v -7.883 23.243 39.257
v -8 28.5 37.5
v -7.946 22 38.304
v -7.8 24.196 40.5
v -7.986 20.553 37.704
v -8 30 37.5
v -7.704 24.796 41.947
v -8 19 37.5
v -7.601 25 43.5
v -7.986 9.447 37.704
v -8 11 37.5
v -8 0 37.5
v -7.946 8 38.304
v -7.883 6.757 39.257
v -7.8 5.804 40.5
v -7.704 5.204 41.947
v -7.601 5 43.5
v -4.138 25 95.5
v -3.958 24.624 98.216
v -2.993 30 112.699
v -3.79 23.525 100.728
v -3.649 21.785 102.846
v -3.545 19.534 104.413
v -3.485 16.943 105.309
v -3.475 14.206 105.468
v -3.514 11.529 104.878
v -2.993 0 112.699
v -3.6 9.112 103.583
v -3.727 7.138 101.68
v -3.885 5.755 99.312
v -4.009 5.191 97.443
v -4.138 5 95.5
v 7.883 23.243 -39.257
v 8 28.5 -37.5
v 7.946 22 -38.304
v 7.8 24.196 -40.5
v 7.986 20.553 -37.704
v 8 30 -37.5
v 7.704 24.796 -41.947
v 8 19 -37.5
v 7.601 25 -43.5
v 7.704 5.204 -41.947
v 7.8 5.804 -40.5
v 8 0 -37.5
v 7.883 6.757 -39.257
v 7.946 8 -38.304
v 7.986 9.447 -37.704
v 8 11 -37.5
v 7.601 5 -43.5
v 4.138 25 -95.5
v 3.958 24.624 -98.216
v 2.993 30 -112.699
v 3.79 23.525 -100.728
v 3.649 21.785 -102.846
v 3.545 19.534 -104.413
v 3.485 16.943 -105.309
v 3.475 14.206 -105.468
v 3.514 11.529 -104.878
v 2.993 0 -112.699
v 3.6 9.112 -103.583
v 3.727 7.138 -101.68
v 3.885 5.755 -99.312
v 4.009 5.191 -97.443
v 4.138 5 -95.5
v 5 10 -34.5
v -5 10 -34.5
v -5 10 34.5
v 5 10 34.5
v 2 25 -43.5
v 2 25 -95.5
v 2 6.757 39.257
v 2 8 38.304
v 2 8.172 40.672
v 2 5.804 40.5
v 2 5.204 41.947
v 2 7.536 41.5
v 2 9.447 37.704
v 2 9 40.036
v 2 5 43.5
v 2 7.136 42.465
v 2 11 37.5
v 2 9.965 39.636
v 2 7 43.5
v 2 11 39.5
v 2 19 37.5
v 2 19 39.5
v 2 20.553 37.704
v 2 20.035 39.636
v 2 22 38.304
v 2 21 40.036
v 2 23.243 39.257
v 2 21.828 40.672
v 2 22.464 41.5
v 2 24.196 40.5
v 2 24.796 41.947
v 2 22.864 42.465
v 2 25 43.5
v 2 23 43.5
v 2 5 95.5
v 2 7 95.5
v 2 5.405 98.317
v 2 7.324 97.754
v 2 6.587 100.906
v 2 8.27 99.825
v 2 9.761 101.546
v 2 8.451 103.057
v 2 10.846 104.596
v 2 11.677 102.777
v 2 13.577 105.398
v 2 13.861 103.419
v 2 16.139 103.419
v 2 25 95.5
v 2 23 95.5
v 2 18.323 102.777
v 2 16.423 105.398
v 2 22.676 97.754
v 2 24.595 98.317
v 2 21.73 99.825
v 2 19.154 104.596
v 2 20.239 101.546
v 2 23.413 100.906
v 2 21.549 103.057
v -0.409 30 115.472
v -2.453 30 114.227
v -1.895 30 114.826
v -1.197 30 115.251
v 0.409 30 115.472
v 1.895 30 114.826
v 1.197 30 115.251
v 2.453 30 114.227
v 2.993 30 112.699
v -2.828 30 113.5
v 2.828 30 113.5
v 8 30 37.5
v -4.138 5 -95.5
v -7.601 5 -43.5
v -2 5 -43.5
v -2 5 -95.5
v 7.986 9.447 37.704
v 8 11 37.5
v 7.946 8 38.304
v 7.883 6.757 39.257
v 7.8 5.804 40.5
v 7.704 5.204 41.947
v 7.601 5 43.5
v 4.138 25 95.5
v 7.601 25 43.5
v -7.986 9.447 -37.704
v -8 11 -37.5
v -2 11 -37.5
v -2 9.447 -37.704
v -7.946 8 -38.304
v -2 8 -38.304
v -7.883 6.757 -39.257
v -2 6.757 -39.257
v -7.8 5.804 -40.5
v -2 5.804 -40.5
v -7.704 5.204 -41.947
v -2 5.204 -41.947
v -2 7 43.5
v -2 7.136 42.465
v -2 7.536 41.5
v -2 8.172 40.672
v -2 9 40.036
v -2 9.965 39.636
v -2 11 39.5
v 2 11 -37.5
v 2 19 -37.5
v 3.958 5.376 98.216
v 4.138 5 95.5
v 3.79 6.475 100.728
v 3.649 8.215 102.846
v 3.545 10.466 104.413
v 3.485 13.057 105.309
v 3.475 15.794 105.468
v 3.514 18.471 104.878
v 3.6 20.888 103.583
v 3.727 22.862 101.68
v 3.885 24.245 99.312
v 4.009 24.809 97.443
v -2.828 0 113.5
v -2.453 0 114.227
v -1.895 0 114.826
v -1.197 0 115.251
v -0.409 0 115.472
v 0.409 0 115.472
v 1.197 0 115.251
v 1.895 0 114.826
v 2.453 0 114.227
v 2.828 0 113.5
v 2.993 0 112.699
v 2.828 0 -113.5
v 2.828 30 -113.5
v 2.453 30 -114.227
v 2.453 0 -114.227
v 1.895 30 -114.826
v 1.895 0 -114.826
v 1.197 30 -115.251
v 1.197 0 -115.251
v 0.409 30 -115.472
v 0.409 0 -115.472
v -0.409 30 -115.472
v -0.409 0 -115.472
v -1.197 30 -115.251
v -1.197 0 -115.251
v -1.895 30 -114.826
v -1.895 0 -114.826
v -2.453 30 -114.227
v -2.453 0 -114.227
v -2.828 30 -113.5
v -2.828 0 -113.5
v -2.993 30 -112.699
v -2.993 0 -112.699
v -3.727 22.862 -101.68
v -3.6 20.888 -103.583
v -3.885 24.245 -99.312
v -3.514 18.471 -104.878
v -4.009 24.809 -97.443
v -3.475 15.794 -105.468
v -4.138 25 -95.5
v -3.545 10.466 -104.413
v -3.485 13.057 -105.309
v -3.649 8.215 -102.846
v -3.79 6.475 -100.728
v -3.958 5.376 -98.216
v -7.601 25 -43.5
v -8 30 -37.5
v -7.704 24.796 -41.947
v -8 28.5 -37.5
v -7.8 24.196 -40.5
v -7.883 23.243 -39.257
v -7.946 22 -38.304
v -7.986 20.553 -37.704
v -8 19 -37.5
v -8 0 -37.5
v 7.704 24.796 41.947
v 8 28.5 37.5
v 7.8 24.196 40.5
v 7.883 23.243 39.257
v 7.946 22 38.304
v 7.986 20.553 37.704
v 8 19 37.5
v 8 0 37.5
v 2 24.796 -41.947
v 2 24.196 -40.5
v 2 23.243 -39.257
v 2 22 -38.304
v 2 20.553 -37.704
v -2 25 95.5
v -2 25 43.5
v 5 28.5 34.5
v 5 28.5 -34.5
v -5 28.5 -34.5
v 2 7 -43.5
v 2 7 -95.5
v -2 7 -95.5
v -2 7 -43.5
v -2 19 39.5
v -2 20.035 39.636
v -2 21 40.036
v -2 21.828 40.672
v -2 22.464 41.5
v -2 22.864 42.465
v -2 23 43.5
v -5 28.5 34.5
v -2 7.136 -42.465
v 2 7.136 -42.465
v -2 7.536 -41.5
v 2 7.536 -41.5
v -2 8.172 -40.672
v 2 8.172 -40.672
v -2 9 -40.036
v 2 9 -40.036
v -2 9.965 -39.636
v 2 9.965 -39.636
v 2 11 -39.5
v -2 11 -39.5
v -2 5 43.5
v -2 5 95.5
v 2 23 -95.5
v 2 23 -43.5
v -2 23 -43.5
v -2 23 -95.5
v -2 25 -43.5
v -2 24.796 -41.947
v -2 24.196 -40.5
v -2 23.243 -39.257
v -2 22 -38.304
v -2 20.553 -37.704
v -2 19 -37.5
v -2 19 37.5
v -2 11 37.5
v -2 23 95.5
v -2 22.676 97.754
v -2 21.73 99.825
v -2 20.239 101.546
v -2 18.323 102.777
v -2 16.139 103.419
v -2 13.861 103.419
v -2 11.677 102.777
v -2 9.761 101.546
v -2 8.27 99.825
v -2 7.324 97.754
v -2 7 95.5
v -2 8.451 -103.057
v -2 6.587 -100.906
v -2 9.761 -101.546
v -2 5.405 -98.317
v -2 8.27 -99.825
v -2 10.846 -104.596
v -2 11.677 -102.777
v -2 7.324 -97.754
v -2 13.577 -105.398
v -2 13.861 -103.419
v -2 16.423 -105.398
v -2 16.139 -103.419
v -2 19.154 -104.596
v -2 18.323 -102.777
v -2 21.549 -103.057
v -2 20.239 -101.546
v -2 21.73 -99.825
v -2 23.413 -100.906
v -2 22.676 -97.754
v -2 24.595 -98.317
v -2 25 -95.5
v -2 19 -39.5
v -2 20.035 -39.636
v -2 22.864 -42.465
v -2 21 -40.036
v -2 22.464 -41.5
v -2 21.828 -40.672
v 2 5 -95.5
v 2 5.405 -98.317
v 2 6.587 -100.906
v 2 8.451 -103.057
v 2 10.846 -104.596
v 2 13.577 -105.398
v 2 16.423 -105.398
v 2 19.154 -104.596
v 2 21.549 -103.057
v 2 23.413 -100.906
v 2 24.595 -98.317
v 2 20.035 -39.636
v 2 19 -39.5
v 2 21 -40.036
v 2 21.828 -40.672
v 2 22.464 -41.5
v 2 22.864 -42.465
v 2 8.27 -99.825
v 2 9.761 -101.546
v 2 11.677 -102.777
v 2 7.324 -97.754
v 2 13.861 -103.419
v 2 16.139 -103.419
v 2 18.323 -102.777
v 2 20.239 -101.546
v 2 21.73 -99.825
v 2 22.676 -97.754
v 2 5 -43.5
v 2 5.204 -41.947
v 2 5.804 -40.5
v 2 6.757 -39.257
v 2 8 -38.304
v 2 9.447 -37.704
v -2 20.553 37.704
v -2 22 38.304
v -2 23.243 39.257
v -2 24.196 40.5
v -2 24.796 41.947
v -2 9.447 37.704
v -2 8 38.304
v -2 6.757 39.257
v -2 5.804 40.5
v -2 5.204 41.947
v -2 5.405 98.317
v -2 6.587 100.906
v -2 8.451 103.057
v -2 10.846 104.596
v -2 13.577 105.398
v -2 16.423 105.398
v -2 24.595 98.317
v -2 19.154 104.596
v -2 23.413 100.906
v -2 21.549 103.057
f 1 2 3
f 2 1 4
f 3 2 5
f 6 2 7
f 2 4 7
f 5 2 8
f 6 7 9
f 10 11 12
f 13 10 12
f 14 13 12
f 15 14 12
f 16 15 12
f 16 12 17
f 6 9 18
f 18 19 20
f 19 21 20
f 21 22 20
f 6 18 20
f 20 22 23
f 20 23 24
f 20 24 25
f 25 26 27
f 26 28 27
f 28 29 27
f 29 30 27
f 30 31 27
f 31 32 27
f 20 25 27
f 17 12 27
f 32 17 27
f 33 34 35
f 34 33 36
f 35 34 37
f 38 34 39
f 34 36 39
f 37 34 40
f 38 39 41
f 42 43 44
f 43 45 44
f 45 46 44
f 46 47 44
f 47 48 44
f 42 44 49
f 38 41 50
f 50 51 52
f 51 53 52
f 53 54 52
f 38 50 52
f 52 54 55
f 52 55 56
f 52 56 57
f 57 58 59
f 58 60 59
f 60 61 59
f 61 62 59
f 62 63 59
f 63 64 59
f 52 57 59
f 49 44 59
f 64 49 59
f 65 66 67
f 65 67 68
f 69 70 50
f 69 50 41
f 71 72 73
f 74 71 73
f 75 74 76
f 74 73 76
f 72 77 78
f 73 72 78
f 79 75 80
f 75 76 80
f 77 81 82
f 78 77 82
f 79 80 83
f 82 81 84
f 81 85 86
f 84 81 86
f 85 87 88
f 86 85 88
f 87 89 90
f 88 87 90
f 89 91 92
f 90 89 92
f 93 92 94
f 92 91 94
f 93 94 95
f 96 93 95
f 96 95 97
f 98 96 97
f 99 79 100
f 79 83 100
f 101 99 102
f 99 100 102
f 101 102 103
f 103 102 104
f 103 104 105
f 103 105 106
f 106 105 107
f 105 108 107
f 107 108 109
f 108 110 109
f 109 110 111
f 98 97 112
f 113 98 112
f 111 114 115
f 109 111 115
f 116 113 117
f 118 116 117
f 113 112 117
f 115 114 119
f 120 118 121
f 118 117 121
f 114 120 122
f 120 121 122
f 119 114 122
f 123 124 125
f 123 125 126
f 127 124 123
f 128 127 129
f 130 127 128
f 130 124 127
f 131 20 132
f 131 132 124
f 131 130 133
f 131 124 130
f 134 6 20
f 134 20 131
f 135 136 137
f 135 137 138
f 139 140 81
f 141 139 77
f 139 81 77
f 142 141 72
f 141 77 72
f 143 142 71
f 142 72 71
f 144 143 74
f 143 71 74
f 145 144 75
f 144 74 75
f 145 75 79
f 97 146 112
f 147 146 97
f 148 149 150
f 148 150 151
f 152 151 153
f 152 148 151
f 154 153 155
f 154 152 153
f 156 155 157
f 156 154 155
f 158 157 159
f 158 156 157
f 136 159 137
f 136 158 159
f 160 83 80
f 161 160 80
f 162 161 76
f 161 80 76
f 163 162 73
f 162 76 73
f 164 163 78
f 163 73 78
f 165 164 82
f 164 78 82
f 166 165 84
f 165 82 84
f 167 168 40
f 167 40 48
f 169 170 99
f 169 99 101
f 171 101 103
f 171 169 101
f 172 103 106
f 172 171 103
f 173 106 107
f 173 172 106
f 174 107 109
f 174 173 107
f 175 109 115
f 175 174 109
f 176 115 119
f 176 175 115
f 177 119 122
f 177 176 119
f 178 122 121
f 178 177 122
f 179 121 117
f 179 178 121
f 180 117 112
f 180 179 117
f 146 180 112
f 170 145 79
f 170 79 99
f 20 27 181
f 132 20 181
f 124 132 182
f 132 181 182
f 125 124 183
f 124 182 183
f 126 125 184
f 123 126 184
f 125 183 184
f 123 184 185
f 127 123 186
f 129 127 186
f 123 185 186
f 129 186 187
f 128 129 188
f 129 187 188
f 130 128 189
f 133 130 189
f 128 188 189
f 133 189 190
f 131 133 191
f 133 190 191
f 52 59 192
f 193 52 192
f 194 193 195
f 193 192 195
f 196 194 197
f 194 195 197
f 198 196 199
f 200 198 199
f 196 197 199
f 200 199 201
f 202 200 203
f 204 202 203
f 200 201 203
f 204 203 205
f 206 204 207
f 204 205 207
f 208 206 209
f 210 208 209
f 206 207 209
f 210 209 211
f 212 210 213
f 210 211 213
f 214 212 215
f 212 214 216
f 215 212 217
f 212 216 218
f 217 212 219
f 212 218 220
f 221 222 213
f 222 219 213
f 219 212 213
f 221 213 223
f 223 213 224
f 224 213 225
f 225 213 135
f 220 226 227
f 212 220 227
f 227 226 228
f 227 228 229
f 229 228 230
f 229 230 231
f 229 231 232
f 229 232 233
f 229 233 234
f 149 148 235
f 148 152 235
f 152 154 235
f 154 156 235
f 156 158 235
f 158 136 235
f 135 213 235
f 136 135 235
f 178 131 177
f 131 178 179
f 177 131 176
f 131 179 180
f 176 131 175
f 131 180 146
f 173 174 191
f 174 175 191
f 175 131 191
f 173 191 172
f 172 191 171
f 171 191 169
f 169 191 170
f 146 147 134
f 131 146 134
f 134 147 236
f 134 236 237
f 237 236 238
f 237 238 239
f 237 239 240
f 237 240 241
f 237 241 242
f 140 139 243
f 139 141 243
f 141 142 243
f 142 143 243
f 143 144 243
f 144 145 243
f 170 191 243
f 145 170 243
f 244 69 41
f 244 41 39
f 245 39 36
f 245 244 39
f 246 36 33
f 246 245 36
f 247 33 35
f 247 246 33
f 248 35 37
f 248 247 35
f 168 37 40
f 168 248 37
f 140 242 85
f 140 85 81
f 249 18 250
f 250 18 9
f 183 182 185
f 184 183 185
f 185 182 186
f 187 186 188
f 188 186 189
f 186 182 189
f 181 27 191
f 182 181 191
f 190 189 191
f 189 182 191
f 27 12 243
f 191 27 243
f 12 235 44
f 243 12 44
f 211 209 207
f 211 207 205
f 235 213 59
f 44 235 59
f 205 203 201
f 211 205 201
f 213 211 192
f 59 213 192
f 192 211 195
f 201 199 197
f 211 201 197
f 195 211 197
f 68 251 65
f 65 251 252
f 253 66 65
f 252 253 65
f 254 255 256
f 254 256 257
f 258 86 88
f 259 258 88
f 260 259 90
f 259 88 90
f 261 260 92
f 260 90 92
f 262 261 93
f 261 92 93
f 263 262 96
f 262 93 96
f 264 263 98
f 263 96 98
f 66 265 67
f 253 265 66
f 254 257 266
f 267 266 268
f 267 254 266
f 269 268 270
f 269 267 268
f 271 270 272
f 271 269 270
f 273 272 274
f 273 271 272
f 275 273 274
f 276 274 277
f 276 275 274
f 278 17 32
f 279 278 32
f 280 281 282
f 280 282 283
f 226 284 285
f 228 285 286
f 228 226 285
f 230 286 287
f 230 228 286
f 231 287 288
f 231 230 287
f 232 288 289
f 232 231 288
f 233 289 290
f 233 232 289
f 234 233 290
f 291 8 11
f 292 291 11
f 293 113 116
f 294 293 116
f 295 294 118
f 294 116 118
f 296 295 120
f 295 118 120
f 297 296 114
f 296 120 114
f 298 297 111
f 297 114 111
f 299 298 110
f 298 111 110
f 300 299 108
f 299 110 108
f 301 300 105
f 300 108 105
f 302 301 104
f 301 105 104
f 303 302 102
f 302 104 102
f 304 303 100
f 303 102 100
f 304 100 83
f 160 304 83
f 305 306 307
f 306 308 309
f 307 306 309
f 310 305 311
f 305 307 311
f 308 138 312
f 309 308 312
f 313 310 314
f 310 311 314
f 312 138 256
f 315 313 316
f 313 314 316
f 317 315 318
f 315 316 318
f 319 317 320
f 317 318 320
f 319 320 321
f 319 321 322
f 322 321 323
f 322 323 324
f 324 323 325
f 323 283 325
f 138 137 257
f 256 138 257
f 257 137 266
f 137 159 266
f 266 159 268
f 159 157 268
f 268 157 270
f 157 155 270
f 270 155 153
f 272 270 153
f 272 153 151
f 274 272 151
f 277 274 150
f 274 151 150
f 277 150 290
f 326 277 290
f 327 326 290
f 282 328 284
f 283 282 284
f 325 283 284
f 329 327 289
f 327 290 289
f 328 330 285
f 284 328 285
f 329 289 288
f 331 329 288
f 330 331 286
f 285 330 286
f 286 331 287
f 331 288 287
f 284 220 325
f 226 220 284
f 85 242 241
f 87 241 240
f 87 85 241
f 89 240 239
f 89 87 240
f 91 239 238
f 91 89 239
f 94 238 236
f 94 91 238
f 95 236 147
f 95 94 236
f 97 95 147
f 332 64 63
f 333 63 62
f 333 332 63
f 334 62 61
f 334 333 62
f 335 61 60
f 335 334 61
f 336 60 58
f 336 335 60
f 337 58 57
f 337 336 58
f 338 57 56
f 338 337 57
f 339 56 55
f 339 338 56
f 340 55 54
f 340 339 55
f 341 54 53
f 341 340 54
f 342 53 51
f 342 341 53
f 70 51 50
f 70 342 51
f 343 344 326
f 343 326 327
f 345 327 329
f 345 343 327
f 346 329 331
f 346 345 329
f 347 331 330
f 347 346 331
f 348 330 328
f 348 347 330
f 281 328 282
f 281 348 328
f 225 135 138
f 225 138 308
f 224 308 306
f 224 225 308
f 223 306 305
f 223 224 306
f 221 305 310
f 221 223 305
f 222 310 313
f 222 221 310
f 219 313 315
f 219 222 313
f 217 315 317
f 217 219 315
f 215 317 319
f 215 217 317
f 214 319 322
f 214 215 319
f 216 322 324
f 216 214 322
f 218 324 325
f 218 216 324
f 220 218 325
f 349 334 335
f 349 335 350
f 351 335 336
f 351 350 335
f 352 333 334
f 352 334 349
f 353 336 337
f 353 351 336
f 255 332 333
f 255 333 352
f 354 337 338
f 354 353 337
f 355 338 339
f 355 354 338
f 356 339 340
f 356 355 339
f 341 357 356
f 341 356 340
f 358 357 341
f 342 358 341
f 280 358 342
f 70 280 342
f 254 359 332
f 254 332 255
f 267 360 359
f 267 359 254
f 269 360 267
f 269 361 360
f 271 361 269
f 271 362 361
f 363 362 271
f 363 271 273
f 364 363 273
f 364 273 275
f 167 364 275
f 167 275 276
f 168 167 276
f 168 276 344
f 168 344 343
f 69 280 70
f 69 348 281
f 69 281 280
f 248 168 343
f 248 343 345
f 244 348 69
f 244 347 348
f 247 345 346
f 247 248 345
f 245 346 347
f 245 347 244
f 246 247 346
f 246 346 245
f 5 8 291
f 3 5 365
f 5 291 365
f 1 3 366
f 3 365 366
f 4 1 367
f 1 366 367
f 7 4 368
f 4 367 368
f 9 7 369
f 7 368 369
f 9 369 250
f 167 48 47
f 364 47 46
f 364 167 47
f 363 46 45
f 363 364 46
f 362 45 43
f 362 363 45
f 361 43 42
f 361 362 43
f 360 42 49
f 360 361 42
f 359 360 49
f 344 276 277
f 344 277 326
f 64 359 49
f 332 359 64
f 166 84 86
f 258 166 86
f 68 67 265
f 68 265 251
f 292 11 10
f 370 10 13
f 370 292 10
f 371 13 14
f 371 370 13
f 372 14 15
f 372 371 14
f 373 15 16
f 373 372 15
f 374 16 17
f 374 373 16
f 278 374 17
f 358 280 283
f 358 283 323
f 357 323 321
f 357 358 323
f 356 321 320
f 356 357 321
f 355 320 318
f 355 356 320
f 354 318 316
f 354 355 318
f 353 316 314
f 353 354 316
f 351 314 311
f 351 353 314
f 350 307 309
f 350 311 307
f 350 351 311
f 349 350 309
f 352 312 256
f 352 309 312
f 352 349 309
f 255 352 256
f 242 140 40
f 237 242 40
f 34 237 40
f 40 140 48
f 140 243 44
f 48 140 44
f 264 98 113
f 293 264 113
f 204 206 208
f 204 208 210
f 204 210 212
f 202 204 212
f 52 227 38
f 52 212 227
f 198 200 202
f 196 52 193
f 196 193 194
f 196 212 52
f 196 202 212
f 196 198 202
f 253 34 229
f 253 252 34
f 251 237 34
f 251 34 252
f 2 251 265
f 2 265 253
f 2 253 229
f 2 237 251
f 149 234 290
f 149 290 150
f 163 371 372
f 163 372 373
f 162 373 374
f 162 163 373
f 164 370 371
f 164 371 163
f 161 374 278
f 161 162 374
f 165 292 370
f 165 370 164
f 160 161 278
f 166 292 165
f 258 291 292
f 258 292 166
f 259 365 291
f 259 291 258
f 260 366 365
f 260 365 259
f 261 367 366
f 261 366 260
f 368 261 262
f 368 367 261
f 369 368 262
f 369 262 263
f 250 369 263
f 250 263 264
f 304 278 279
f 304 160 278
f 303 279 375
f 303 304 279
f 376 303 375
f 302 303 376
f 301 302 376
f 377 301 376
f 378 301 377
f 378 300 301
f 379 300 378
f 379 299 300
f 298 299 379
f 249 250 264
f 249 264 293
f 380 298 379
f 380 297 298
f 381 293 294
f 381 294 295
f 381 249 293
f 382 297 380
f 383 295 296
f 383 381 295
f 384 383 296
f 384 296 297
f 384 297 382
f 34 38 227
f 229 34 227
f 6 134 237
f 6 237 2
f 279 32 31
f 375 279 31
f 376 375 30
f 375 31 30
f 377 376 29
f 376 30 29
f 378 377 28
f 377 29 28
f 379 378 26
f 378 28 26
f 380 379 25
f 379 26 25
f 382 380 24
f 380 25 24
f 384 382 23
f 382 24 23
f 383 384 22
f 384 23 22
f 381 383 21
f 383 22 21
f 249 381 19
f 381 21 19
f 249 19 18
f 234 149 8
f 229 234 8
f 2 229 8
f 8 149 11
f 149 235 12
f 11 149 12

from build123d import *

# Parameters (mm, degrees)
BASE_EXTRUDE_DEPTH   = 30
CUT_EXTRUDE1_DEPTH   = 6
FILLET1_R            = 6
FILLET1_OF_MIRROR1_R = 6
MIRROR2_START        = -8
MIRROR2_DEPTH        = 6
MIRROR2_START_2      = 2
MIRROR2_2_DEPTH      = 6
SKETCH5_W            = 16
SKETCH5_H            = 75
CUT_EXTRUDE3_DEPTH   = 1.5
SKETCH6_W            = 10
SKETCH6_H            = 69
CUT_EXTRUDE4_DEPTH   = 18.5
CUT_EXTRUDE5_DEPTH   = 120.750782878


# Read off the part's stored shape, not the designer's step: Mirror2
with BuildPart() as part:
    # Sketch1 → Base-Extrude (new body)
    with BuildSketch(Plane(origin=(0, 0, 0), x_dir=(1, 0, 0), z_dir=(0, 1, 0))):
        with BuildLine():
            Line((8, 37.5), (2.993373056, 112.699293126))
            ThreePointArc((2.993373056, 112.699293126), (0, 115.5), (-2.993373056, 112.699293126))
            Line((-2.993373056, 112.699293126), (-8, 37.5))
            Line((-8, 37.5), (-8, -37.5))
            Line((-8, -37.5), (-2.993373056, -112.699293126))
            ThreePointArc((-2.993373056, -112.699293126), (0, -115.5), (2.993373056, -112.699293126))
            Line((2.993373056, -112.699293126), (8, -37.5))
            Line((8, -37.5), (8, 37.5))
        make_face()
    extrude(amount=BASE_EXTRUDE_DEPTH)

    # Sketch2 → Cut-Extrude1 (cut)
    with BuildSketch(Plane(origin=(8, 0, 0), x_dir=(0, 0, -1), z_dir=(1, 0, 0))):
        with BuildLine():
            Line((-37.5, 5), (-95.5, 5))
            ThreePointArc((-95.5, 5), (-105.5, 15), (-95.5, 25))
            Line((-95.5, 25), (-37.5, 25))
            Line((-37.5, 25), (-37.5, 5))
        make_face()
    cut_extrude1 = extrude(amount=-CUT_EXTRUDE1_DEPTH, mode=Mode.SUBTRACT)

    # Fillet1
    fillet1_edges = [part.edges().sort_by_distance(p)[0] for p in [
        (5, 25, 37.5),
        (5, 5, 37.5),
    ]]
    fillet(fillet1_edges, radius=FILLET1_R)

    # Mirror1: Cut-Extrude1 across plane
    add(cut_extrude1.mirror(Plane(origin=(0, 0, 0), x_dir=(0, 0, 1), z_dir=(1, 0, 0))), mode=Mode.SUBTRACT)

    # Fillet1 of Mirror1
    fillet1_of_mirror1_edges = [part.edges().sort_by_distance(p)[0] for p in [
        (-5, 25, 37.5),
        (-5, 5, 37.5),
    ]]
    fillet(fillet1_of_mirror1_edges, radius=FILLET1_OF_MIRROR1_R)

    # Mirror2 outline → Mirror2 (cut)
    with BuildSketch(Plane.YZ.offset(MIRROR2_START)):
        with BuildLine():
            Line((5, -43.5), (5, -95.5))
            ThreePointArc((5, -95.5), (15, -105.5), (25, -95.5))
            Line((25, -95.5), (25, -43.5))
            ThreePointArc((25, -43.5), (23.242640687, -39.257359313), (19, -37.5))
            Line((19, -37.5), (11, -37.5))
            ThreePointArc((11, -37.5), (6.757359313, -39.257359313), (5, -43.5))
        make_face()
    extrude(amount=MIRROR2_DEPTH, mode=Mode.SUBTRACT)

    # Mirror2 2 outline → Mirror2 2 (cut)
    with BuildSketch(Plane.YZ.offset(MIRROR2_START_2)):
        with BuildLine():
            Line((5, -43.5), (5, -95.5))
            ThreePointArc((5, -95.5), (15, -105.5), (25, -95.5))
            Line((25, -95.5), (25, -43.5))
            ThreePointArc((25, -43.5), (23.242640687, -39.257359313), (19, -37.5))
            Line((19, -37.5), (11, -37.5))
            ThreePointArc((11, -37.5), (6.757359313, -39.257359313), (5, -43.5))
        make_face()
    extrude(amount=MIRROR2_2_DEPTH, mode=Mode.SUBTRACT)

    # Sketch5 → Cut-Extrude3 (cut)
    with BuildSketch(Plane(origin=(0, 30, 0), x_dir=(-1, 0, 0), z_dir=(0, 1, 0))):
        Rectangle(SKETCH5_W, SKETCH5_H)
    extrude(amount=-CUT_EXTRUDE3_DEPTH, mode=Mode.SUBTRACT)

    # Sketch6 → Cut-Extrude4 (cut)
    with BuildSketch(Plane(origin=(0, 28.5, 0), x_dir=(1, 0, 0), z_dir=(0, 1, 0))):
        Rectangle(SKETCH6_W, SKETCH6_H)
    extrude(amount=-CUT_EXTRUDE4_DEPTH, mode=Mode.SUBTRACT)

    # Sketch7 → Cut-Extrude5 (cut, through all)
    with BuildSketch(Plane(origin=(2, 0, 0), x_dir=(0, 0, -1), z_dir=(1, 0, 0))):
        with BuildLine():
            Line((39.5, 11), (39.5, 19))
            ThreePointArc((39.5, 19), (40.671572875, 21.828427125), (43.5, 23))
            Line((43.5, 23), (95.5, 23))
            ThreePointArc((95.5, 23), (103.5, 15), (95.5, 7))
            Line((95.5, 7), (43.5, 7))
            ThreePointArc((43.5, 7), (40.671572875, 8.171572875), (39.5, 11))
        make_face()
        with BuildLine():
            Line((-95.5, 7), (-43.5, 7))
            ThreePointArc((-43.5, 7), (-40.671572875, 8.171572875), (-39.5, 11))
            Line((-39.5, 11), (-39.5, 19))
            ThreePointArc((-39.5, 19), (-40.671572875, 21.828427125), (-43.5, 23))
            Line((-43.5, 23), (-95.5, 23))
            ThreePointArc((-95.5, 23), (-103.5, 15), (-95.5, 7))
        make_face()
    extrude(amount=-CUT_EXTRUDE5_DEPTH, mode=Mode.SUBTRACT)


solid = part.part
